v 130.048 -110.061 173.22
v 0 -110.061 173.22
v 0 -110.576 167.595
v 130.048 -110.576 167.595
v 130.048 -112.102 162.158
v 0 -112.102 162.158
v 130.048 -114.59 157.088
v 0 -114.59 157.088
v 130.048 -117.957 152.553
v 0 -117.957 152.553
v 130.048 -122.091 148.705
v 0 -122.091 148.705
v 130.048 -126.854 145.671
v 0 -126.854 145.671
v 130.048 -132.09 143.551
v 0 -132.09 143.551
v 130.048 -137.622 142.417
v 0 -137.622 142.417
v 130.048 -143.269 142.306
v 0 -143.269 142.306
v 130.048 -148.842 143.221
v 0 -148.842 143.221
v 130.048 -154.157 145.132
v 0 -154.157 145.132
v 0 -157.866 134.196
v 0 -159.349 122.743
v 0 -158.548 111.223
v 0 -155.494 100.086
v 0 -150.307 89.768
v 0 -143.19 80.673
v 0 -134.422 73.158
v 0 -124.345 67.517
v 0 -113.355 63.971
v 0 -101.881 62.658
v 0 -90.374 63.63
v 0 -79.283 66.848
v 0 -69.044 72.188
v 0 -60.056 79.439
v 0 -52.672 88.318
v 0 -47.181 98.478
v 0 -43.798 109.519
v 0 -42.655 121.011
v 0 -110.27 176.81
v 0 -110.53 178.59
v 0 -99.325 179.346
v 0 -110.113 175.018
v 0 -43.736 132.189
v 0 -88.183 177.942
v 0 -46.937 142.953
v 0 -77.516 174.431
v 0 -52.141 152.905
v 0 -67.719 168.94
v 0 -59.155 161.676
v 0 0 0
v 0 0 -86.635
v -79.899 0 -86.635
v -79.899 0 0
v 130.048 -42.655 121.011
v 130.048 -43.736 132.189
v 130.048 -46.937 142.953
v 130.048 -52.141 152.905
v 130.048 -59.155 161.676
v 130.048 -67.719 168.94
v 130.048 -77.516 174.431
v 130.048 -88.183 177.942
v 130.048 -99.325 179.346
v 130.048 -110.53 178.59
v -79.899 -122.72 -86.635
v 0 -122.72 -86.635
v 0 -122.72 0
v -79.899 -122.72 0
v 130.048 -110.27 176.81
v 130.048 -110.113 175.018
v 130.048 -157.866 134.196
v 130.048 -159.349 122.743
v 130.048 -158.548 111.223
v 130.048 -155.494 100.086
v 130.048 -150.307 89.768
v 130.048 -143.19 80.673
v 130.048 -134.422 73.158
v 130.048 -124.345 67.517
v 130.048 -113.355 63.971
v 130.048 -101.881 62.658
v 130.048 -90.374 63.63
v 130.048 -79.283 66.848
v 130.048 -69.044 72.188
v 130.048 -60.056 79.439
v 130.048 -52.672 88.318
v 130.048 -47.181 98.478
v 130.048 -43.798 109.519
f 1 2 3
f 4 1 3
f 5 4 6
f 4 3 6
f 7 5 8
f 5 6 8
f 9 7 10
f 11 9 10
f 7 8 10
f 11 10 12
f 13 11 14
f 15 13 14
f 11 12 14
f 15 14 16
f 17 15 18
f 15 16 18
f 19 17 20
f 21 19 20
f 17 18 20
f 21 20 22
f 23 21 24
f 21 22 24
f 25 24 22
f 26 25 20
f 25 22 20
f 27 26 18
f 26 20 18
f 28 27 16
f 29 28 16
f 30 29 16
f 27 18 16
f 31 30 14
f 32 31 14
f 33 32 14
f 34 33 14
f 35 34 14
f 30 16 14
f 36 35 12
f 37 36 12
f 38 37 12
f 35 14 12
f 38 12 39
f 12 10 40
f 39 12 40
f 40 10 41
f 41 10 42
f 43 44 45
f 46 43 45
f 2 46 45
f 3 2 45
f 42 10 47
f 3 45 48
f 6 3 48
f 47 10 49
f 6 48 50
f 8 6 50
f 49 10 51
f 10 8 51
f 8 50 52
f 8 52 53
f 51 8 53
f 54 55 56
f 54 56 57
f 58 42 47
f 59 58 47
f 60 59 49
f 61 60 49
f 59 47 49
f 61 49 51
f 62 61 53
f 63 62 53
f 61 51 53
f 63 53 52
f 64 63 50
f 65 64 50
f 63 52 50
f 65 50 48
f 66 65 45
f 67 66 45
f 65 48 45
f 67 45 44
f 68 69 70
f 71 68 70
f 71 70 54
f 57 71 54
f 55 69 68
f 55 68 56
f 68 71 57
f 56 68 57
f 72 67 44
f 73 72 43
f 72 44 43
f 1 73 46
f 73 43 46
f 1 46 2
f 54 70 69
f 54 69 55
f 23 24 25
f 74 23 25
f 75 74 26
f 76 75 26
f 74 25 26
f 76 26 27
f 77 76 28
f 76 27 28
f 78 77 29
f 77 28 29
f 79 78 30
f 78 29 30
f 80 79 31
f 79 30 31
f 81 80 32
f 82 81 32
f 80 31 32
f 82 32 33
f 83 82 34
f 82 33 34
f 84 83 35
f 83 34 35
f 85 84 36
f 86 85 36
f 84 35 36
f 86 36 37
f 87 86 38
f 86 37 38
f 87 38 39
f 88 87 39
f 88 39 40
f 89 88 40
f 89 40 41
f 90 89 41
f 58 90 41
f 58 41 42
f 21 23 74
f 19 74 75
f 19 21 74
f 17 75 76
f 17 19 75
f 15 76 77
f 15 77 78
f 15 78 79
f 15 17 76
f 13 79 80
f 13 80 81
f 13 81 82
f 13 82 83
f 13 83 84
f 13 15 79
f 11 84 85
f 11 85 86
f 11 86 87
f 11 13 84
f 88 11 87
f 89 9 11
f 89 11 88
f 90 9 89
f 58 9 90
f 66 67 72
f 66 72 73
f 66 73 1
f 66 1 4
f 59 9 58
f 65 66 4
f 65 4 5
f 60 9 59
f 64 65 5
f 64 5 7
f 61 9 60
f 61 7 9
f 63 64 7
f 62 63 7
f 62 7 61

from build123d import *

# Parameters (mm, degrees)
F0_W     = 122.719718
F0_H     = 86.635407
F1_DEPTH = 79.899499
F2_DEPTH = 130.048


with BuildPart() as f1:
    # F0 (on Right) → F1 (new body)
    with BuildSketch(Plane.YZ):
        with Locations((-61.359859, -43.317704)):
            Rectangle(F0_W, F0_H)
    extrude(amount=-F1_DEPTH)


with BuildPart() as f2:
    # F0 (on Right) → F2 (new body)
    with BuildSketch(Plane.YZ):
        with BuildLine():
            ThreePointArc((-154.156573, 145.132253), (-113.354682, 63.970719), (-42.655332, 121.010974))
            ThreePointArc((-42.655332, 121.010974), (-63.262023, 165.514523), (-110.529741, 178.589858))
            ThreePointArc((-110.529741, 178.589858), (-110.178361, 175.914944), (-110.060938, 173.219606))
            ThreePointArc((-110.060938, 173.219606), (-124.403443, 147.079003), (-154.156573, 145.132253))
        make_face()
    extrude(amount=F2_DEPTH)


solid = Compound([f1.part, f2.part])
